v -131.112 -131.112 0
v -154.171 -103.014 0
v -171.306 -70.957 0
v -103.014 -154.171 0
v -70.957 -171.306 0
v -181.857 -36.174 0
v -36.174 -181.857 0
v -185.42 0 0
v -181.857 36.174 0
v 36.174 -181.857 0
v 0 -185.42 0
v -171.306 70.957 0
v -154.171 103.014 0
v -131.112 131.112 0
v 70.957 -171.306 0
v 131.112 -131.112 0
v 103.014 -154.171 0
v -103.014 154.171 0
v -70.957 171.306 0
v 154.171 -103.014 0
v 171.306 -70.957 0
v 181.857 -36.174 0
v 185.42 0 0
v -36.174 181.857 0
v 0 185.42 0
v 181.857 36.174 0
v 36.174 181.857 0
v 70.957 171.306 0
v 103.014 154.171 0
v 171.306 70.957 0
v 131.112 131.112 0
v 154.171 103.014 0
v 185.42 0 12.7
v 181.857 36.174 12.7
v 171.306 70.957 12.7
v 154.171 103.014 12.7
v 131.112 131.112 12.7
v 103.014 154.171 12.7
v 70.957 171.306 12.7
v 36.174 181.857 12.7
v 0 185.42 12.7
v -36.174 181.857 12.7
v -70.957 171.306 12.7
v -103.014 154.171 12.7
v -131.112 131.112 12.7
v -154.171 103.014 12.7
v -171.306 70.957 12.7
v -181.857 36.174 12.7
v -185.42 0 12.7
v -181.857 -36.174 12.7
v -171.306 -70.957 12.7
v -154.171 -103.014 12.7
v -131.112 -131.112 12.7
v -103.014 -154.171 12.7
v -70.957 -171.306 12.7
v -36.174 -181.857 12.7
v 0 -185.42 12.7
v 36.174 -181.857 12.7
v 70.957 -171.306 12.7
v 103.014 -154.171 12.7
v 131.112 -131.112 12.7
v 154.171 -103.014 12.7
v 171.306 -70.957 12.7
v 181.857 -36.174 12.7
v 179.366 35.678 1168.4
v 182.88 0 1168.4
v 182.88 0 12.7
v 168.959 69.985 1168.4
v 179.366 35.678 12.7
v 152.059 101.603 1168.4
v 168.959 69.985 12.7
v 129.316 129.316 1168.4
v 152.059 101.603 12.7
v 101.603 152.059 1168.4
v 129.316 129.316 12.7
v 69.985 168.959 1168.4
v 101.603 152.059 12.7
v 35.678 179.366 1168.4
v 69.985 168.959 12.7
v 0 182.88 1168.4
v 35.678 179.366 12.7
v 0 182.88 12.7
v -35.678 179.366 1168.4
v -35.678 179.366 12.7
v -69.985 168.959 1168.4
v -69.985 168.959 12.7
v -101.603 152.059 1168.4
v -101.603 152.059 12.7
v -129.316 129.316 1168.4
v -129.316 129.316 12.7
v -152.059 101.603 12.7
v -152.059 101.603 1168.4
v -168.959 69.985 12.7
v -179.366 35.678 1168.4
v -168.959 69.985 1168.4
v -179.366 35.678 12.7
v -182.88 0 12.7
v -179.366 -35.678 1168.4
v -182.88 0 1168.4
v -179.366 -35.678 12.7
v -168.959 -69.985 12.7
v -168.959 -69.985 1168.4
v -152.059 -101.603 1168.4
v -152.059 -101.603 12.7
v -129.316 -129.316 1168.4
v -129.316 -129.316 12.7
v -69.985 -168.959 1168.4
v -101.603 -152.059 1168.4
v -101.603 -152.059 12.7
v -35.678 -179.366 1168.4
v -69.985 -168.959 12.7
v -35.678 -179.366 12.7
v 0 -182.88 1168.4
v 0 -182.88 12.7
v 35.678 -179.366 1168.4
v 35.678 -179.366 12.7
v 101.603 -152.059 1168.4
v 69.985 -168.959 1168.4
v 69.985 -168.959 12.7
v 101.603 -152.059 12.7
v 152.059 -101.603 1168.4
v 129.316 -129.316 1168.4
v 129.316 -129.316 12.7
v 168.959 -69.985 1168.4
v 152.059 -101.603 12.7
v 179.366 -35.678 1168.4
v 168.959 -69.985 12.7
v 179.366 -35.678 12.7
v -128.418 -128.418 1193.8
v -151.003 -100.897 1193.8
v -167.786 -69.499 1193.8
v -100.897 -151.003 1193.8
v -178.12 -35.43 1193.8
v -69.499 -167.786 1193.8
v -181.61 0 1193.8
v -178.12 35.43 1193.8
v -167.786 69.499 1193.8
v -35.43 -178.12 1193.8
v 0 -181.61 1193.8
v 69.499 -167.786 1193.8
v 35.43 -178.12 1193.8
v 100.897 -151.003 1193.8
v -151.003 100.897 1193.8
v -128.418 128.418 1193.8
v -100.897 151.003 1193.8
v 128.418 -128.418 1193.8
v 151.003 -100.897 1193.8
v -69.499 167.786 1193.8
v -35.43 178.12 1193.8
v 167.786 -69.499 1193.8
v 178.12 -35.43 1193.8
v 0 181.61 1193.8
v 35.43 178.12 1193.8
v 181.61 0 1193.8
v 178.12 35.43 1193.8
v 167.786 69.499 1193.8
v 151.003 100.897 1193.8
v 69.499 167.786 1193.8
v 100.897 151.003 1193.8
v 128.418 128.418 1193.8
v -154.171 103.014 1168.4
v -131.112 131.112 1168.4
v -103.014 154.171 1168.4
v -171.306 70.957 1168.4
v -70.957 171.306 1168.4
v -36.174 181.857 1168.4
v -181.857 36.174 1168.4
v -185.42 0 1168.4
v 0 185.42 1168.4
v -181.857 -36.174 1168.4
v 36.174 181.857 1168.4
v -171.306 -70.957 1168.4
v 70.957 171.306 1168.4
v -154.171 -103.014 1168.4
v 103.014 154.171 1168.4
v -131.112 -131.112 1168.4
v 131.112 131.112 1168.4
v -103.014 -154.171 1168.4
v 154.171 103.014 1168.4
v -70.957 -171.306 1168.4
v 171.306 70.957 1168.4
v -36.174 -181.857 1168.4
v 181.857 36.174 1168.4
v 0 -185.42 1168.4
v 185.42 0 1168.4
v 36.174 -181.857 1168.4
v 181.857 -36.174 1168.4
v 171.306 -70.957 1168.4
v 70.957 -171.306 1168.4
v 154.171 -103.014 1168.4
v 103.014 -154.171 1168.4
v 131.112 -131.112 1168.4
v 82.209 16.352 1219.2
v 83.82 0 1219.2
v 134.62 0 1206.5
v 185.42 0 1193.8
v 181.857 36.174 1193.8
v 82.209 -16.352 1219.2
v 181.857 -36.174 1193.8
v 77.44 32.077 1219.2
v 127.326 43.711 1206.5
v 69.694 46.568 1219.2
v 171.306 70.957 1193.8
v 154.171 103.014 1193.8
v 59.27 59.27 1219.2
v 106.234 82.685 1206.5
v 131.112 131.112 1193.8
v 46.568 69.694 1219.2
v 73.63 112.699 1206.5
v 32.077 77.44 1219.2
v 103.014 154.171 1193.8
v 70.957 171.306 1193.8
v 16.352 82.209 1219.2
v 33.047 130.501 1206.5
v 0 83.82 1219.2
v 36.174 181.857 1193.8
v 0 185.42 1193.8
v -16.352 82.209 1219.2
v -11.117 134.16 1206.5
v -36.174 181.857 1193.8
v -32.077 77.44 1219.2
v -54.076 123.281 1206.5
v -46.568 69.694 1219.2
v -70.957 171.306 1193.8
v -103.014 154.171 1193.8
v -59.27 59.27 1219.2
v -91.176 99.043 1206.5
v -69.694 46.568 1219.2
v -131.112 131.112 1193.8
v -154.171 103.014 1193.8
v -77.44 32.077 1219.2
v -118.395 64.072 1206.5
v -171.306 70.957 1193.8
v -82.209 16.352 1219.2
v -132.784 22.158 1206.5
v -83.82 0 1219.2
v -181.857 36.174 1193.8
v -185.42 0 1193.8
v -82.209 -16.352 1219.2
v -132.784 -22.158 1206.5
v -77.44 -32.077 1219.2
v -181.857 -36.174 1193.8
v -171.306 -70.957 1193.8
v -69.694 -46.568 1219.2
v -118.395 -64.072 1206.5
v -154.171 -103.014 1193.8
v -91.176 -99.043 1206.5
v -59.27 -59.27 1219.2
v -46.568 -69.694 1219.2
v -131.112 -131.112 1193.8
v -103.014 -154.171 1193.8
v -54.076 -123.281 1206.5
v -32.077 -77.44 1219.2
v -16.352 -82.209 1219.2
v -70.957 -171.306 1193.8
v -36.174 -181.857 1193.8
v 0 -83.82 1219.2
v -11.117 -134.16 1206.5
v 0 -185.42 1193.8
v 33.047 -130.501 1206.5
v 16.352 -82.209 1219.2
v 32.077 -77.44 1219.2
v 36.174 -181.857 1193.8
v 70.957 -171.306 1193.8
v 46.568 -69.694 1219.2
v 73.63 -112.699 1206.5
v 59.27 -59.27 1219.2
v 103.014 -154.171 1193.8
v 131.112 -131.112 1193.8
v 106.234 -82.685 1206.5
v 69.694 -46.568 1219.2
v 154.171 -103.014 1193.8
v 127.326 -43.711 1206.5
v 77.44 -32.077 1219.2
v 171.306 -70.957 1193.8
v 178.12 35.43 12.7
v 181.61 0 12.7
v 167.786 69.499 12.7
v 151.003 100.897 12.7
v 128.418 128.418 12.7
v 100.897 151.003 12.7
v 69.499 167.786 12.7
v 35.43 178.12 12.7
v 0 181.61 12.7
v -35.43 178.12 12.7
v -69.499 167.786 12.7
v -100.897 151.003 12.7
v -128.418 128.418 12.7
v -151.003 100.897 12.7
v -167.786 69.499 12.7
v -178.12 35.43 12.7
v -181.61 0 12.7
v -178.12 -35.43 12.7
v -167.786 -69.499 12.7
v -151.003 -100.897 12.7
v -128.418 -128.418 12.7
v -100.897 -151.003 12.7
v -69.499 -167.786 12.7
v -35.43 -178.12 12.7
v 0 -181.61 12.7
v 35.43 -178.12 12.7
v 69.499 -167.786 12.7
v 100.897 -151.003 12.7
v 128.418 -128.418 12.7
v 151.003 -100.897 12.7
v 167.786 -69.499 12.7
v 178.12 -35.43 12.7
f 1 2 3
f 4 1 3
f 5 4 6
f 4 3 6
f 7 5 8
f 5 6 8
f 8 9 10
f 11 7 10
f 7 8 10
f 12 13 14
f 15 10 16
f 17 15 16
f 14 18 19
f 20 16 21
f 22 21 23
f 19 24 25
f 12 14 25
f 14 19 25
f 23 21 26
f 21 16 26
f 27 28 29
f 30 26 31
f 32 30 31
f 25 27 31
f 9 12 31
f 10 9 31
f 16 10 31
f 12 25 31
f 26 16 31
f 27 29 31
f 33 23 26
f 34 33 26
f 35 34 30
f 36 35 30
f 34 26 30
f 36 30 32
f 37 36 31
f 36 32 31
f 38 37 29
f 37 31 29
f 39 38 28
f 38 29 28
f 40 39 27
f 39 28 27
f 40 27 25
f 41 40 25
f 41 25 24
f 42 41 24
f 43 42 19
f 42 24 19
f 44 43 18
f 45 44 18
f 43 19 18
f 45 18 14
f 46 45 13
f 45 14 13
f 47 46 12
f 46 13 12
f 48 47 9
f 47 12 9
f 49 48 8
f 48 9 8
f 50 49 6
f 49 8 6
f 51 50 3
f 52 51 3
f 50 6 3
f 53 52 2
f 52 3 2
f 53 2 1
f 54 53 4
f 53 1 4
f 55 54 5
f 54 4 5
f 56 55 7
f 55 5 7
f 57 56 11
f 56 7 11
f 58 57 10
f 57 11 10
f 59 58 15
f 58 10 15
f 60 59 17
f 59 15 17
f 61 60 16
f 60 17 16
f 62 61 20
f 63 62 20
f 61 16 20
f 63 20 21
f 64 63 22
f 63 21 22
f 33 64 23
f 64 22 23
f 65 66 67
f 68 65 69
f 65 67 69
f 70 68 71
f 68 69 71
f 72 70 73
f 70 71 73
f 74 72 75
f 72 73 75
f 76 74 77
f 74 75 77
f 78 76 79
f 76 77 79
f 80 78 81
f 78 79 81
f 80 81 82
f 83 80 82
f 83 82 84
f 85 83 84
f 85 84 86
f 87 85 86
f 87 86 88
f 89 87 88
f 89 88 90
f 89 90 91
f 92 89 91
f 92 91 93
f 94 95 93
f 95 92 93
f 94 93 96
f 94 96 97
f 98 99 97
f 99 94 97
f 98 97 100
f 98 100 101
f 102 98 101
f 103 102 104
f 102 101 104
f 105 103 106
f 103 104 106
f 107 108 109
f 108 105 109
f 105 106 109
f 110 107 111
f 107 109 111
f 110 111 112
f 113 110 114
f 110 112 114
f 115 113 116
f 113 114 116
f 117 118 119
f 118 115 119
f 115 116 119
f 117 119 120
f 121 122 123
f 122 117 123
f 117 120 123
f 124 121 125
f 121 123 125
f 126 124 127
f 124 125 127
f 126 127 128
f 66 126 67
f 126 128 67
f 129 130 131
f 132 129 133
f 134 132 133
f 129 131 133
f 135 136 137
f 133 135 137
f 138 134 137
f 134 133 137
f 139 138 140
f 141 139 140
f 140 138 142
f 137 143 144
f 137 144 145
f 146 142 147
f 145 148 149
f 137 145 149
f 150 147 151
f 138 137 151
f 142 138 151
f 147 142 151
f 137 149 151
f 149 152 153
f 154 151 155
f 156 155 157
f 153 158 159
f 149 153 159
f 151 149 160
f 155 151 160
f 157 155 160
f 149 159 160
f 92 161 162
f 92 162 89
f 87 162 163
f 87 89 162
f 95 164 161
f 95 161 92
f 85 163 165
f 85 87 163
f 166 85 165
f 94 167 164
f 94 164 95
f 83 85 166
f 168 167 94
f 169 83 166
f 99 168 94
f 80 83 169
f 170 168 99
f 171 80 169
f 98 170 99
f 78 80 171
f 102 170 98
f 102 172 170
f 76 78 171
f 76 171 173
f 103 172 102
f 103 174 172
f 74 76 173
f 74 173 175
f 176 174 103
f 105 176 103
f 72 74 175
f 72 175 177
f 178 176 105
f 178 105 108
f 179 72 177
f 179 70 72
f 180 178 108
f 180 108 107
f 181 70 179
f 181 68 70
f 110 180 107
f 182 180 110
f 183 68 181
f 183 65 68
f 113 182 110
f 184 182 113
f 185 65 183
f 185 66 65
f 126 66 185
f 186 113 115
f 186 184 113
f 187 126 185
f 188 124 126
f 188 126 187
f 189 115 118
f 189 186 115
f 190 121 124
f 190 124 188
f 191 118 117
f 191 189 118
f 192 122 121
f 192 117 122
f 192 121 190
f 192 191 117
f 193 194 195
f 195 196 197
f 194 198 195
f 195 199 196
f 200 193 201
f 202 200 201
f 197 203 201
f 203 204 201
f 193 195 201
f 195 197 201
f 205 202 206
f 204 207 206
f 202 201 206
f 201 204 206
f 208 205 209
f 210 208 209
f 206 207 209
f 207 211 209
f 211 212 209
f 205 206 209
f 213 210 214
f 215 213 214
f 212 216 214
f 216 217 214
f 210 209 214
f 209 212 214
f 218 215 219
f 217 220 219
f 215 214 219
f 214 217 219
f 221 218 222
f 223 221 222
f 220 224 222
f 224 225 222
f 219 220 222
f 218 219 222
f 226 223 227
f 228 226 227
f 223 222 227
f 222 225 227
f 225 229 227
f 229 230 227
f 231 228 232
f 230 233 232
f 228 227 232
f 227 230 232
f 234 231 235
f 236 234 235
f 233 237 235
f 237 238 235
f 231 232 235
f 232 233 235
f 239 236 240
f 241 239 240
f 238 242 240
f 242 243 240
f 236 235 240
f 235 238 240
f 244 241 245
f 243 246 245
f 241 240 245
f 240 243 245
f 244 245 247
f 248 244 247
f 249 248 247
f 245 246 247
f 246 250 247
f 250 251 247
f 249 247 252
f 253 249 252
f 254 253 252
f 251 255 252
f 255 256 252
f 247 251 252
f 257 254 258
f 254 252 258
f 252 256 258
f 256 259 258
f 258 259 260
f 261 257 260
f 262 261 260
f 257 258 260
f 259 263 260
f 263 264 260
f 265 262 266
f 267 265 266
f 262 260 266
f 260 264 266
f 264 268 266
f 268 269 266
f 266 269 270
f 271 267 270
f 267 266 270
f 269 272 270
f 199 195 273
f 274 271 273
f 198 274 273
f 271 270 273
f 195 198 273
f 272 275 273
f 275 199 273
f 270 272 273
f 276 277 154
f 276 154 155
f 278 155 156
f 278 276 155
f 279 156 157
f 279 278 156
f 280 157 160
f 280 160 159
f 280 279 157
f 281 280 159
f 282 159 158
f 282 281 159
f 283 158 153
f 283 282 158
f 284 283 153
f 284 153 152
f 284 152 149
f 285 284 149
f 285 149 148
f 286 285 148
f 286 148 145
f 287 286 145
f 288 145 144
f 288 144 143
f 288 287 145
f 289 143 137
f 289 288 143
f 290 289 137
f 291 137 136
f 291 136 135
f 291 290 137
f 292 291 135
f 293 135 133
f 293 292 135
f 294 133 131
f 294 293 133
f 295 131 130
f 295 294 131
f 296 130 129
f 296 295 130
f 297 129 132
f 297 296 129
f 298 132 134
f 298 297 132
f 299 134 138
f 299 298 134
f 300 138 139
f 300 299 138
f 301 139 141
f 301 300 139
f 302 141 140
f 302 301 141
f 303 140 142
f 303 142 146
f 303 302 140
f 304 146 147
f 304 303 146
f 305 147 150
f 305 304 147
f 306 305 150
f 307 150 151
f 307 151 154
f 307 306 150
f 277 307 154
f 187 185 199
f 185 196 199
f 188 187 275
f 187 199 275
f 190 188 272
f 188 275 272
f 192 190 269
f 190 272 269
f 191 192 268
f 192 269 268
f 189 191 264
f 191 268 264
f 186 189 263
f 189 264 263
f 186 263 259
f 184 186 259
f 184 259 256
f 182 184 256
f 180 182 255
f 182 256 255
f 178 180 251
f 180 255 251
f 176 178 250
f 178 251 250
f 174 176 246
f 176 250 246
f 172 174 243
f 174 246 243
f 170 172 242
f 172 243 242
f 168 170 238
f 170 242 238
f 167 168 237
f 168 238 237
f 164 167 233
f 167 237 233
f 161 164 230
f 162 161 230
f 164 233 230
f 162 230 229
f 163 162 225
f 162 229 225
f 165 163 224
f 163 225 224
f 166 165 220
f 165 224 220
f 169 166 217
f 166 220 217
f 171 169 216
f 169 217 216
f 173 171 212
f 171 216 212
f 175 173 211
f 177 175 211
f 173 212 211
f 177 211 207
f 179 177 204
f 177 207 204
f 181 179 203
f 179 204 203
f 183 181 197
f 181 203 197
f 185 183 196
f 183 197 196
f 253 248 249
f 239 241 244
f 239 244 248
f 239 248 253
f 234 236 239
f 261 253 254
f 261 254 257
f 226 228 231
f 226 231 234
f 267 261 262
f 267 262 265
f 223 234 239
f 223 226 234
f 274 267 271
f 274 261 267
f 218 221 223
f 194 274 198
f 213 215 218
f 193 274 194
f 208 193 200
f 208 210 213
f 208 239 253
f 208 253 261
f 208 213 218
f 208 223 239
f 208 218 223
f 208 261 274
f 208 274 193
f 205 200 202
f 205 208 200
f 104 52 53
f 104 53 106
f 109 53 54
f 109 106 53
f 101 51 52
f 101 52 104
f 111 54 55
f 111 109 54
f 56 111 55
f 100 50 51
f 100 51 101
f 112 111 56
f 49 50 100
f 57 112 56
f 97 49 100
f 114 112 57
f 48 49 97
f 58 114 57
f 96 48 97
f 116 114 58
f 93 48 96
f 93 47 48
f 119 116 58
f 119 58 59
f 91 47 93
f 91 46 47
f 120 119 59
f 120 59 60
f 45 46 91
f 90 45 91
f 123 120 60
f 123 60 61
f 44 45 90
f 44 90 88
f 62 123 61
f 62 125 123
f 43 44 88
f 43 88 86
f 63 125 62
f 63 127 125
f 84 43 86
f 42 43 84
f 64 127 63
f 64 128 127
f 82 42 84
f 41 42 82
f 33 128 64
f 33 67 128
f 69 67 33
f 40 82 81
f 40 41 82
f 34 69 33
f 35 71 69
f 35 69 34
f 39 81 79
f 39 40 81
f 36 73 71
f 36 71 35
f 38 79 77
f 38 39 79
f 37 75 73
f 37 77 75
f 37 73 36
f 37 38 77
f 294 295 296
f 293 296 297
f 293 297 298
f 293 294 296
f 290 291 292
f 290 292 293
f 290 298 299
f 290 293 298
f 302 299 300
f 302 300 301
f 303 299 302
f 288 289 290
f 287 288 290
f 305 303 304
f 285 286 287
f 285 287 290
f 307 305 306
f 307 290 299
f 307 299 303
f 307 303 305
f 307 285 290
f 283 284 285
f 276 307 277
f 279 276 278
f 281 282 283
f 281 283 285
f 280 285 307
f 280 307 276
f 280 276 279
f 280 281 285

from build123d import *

# Parameters (mm, degrees)
F0_R     = 185.42
F1_DEPTH = 12.7
F2_R     = 182.88
F2_R_2   = 181.61
F3_DEPTH = 1181.1
F4_R     = 185.42
F5_DEPTH = 25.4
F6_SIZE2 = 25.39999
F6_SIZE  = 101.59999
F7_R     = 185.42
F7_R_2   = 182.88
F8_DEPTH = 25.4


# Not quite as in the source:
# - a fillet or chamfer is up to 0.001 mm smaller than in the source, because OpenCascade refuses the exact size


with BuildPart() as f1:
    # F0 (on Top) → F1 (new body)
    with BuildSketch(Plane.XY):
        Circle(F0_R)
    extrude(amount=F1_DEPTH)

    # F2 (on face) → F3 (join)
    with BuildSketch(Plane.XY.offset(12.7)):
        Circle(F2_R)
        Circle(F2_R_2, mode=Mode.SUBTRACT)
    extrude(amount=F3_DEPTH)

    # F4 (on face) → F5 (join)
    with BuildSketch(Plane.XY.offset(1193.8)):
        Circle(F4_R)
    extrude(amount=F5_DEPTH)

    # F6 (size 101.6 and 25.4 in the source; OpenCascade refuses exactly that, so slightly less here)
    f6_edges = [f1.edges().sort_by_distance(p)[0] for p in [
        (-185.42, 0, 1219.2),
    ]]
    f6_side = f1.faces().sort_by_distance((0, 0, 1219.2))[0]
    chamfer(f6_edges, length=F6_SIZE, length2=F6_SIZE2, reference=f6_side)

    # F7 (on face) → F8 (join)
    with BuildSketch(Plane(origin=(0, 0, 1193.8), x_dir=(1, 0, 0), z_dir=(0, 0, -1))):
        Circle(F7_R)
        Circle(F7_R_2, mode=Mode.SUBTRACT)
    extrude(amount=F8_DEPTH)


solid = f1.part
